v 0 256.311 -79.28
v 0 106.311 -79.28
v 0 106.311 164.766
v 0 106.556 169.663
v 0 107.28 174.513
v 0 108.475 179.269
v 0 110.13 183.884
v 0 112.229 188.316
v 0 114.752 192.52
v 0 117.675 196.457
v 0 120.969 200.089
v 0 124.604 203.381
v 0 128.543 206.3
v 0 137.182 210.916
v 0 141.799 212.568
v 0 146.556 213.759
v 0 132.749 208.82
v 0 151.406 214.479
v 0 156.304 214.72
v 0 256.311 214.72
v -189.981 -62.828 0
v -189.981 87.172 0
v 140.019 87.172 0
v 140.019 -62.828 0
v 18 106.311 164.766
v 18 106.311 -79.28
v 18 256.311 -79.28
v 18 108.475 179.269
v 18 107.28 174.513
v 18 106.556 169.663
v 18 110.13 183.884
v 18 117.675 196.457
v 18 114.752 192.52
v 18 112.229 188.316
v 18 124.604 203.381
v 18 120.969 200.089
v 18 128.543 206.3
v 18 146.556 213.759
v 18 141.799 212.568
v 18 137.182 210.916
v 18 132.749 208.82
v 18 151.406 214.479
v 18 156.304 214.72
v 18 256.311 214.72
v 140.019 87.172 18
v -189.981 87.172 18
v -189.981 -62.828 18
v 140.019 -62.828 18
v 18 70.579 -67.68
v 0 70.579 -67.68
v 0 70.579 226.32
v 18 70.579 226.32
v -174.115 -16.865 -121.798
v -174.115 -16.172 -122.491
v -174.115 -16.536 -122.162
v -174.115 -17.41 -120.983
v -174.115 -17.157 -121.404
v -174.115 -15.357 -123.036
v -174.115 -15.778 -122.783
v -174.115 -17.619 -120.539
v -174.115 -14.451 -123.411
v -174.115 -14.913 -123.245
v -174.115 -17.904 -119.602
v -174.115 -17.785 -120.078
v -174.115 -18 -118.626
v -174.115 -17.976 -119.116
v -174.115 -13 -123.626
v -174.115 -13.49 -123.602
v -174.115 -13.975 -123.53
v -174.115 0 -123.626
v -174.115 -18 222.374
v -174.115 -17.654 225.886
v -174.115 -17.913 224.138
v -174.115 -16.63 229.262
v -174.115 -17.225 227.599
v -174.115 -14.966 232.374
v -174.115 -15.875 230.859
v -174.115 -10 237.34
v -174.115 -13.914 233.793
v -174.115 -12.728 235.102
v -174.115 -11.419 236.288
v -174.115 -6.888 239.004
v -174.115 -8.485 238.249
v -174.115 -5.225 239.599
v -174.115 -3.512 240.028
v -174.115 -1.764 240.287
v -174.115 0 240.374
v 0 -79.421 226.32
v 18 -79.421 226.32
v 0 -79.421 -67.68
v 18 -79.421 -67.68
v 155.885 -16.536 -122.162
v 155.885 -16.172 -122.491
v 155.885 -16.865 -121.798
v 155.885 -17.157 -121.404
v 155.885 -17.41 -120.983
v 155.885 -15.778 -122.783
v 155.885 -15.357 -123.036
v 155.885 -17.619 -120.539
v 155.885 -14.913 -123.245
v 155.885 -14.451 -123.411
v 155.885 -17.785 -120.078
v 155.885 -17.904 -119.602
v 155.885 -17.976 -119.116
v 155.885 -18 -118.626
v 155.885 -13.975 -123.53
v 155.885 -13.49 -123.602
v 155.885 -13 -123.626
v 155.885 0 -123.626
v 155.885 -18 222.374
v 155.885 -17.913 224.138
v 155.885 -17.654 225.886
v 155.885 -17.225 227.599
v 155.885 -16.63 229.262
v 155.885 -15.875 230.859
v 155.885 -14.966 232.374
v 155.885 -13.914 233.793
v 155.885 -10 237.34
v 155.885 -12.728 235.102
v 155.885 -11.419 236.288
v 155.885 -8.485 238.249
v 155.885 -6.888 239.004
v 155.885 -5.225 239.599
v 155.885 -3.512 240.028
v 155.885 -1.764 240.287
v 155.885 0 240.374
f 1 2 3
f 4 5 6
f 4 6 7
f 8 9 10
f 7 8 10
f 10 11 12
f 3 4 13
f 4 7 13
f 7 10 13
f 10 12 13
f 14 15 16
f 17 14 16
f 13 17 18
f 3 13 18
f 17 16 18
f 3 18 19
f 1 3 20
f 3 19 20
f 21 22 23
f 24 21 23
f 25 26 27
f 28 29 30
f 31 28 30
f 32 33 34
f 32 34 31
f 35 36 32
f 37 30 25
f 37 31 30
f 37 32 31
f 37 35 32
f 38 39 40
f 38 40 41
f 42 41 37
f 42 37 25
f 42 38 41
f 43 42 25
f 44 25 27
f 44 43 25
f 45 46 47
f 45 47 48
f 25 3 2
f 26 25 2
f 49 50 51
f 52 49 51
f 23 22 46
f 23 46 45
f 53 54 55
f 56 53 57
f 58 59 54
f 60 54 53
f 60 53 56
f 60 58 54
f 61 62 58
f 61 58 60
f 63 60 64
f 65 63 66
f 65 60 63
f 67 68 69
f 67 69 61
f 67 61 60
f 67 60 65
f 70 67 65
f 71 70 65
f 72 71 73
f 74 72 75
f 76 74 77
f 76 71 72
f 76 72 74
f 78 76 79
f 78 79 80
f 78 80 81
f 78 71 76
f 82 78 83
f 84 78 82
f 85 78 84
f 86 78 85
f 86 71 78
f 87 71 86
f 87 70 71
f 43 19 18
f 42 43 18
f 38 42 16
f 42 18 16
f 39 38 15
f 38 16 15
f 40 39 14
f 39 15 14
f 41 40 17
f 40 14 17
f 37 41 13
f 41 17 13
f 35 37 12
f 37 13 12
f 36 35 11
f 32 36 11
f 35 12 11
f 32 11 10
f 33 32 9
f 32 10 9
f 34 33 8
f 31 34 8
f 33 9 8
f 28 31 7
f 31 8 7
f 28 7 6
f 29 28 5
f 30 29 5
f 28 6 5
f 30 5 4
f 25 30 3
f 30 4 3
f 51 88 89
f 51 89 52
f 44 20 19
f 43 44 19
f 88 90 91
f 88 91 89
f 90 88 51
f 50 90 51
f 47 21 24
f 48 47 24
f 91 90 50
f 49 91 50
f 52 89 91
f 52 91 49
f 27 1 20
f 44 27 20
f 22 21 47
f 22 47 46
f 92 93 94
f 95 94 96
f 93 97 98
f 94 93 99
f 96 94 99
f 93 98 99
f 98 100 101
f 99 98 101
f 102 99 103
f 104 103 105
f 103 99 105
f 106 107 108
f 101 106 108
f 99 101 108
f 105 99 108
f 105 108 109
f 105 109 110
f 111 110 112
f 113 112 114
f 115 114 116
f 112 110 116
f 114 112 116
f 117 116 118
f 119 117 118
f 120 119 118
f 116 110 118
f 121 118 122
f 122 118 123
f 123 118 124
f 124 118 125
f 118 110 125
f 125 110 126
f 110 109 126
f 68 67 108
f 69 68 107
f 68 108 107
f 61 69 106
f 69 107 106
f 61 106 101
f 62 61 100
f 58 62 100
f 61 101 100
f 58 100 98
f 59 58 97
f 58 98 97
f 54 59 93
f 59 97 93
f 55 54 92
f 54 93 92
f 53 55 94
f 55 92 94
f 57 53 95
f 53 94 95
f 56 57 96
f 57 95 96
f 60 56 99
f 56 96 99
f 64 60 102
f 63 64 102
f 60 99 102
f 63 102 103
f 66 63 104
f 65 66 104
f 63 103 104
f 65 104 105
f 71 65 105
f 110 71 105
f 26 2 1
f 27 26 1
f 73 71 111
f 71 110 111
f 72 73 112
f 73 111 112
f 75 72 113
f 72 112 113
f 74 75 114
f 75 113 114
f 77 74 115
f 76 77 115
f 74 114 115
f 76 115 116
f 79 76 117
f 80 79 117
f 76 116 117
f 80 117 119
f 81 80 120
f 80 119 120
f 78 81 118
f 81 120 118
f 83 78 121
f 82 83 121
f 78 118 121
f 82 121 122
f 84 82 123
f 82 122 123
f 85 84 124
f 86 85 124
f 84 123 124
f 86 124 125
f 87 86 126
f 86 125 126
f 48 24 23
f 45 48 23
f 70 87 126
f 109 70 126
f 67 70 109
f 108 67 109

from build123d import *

# Parameters (mm, degrees)
F0_W     = 330
F0_H     = 150
F1_DEPTH = 18
F2_W     = 150
F2_H     = 294
F3_DEPTH = 18
F6_DEPTH = 18
F7_W     = 330
F7_H     = 364
F8_DEPTH = 18
F9_R     = 5
F10_R    = 17.99999


# Not quite as in the source:
# - a fillet or chamfer is up to 0.001 mm smaller than in the source, because OpenCascade refuses the exact size
# - ends of sketch curves that miss each other by under 0.0002 mm in the source are joined


with BuildPart() as f1:
    # F0 (on Top) → F1 (new body)
    with BuildSketch(Plane.XY):
        with Locations((-24.9805187998, 12.1723785996)):
            Rectangle(F0_W, F0_H)
    extrude(amount=F1_DEPTH)


with BuildPart() as f3:
    # F2 (on Right) → F3 (new body)
    with BuildSketch(Plane.YZ):
        with Locations((-4.4208914042, 79.3204397765)):
            Rectangle(F2_W, F2_H)
    extrude(amount=F3_DEPTH)


with BuildPart() as f6:
    # F5 (on face) → F6 (new body)
    with BuildSketch(Plane.YZ):
        with BuildLine():
            Line((106.3111022115, 164.7659689188), (106.3111022115, 164.7199944413))
            Line((106.3111022115, 164.7199944413), (106.3111022115, -79.2800055587))
            Line((106.3111022115, -79.2800055587), (256.3111022115, -79.2800055587))
            Line((256.3111022115, -79.2800055587), (256.3111022115, 214.7199944413))
            Line((256.3111022115, 214.7199944413), (156.3111022115, 214.7199944413))
            Line((156.3111022115, 214.7199944413), (156.3036441803, 214.7199944413))
            ThreePointArc((156.3036441803, 214.7199944413), (120.9693833899, 200.0889484934), (106.3111022115, 164.7659689188))
        make_face()
    extrude(amount=F6_DEPTH)


with BuildPart() as f8:
    # F7 (on Front) → F8 (new body)
    with BuildSketch(Plane.XZ):
        with Locations((-9.1152150415, 58.3739206195)):
            Rectangle(F7_W, F7_H)
    extrude(amount=F8_DEPTH)

    # F9
    f9_edges = [f8.edges().sort_by_distance(p)[0] for p in [
        (-9.115215, -18, -123.626079),
    ]]
    fillet(f9_edges, radius=F9_R)

    # F10 (radius 18 in the source; OpenCascade refuses exactly that, so slightly less here)
    f10_edges = [f8.edges().sort_by_distance(p)[0] for p in [
        (-9.115215, -18, 240.373921),
    ]]
    fillet(f10_edges, radius=F10_R)


solid = Compound([f1.part, f3.part, f6.part, f8.part])
